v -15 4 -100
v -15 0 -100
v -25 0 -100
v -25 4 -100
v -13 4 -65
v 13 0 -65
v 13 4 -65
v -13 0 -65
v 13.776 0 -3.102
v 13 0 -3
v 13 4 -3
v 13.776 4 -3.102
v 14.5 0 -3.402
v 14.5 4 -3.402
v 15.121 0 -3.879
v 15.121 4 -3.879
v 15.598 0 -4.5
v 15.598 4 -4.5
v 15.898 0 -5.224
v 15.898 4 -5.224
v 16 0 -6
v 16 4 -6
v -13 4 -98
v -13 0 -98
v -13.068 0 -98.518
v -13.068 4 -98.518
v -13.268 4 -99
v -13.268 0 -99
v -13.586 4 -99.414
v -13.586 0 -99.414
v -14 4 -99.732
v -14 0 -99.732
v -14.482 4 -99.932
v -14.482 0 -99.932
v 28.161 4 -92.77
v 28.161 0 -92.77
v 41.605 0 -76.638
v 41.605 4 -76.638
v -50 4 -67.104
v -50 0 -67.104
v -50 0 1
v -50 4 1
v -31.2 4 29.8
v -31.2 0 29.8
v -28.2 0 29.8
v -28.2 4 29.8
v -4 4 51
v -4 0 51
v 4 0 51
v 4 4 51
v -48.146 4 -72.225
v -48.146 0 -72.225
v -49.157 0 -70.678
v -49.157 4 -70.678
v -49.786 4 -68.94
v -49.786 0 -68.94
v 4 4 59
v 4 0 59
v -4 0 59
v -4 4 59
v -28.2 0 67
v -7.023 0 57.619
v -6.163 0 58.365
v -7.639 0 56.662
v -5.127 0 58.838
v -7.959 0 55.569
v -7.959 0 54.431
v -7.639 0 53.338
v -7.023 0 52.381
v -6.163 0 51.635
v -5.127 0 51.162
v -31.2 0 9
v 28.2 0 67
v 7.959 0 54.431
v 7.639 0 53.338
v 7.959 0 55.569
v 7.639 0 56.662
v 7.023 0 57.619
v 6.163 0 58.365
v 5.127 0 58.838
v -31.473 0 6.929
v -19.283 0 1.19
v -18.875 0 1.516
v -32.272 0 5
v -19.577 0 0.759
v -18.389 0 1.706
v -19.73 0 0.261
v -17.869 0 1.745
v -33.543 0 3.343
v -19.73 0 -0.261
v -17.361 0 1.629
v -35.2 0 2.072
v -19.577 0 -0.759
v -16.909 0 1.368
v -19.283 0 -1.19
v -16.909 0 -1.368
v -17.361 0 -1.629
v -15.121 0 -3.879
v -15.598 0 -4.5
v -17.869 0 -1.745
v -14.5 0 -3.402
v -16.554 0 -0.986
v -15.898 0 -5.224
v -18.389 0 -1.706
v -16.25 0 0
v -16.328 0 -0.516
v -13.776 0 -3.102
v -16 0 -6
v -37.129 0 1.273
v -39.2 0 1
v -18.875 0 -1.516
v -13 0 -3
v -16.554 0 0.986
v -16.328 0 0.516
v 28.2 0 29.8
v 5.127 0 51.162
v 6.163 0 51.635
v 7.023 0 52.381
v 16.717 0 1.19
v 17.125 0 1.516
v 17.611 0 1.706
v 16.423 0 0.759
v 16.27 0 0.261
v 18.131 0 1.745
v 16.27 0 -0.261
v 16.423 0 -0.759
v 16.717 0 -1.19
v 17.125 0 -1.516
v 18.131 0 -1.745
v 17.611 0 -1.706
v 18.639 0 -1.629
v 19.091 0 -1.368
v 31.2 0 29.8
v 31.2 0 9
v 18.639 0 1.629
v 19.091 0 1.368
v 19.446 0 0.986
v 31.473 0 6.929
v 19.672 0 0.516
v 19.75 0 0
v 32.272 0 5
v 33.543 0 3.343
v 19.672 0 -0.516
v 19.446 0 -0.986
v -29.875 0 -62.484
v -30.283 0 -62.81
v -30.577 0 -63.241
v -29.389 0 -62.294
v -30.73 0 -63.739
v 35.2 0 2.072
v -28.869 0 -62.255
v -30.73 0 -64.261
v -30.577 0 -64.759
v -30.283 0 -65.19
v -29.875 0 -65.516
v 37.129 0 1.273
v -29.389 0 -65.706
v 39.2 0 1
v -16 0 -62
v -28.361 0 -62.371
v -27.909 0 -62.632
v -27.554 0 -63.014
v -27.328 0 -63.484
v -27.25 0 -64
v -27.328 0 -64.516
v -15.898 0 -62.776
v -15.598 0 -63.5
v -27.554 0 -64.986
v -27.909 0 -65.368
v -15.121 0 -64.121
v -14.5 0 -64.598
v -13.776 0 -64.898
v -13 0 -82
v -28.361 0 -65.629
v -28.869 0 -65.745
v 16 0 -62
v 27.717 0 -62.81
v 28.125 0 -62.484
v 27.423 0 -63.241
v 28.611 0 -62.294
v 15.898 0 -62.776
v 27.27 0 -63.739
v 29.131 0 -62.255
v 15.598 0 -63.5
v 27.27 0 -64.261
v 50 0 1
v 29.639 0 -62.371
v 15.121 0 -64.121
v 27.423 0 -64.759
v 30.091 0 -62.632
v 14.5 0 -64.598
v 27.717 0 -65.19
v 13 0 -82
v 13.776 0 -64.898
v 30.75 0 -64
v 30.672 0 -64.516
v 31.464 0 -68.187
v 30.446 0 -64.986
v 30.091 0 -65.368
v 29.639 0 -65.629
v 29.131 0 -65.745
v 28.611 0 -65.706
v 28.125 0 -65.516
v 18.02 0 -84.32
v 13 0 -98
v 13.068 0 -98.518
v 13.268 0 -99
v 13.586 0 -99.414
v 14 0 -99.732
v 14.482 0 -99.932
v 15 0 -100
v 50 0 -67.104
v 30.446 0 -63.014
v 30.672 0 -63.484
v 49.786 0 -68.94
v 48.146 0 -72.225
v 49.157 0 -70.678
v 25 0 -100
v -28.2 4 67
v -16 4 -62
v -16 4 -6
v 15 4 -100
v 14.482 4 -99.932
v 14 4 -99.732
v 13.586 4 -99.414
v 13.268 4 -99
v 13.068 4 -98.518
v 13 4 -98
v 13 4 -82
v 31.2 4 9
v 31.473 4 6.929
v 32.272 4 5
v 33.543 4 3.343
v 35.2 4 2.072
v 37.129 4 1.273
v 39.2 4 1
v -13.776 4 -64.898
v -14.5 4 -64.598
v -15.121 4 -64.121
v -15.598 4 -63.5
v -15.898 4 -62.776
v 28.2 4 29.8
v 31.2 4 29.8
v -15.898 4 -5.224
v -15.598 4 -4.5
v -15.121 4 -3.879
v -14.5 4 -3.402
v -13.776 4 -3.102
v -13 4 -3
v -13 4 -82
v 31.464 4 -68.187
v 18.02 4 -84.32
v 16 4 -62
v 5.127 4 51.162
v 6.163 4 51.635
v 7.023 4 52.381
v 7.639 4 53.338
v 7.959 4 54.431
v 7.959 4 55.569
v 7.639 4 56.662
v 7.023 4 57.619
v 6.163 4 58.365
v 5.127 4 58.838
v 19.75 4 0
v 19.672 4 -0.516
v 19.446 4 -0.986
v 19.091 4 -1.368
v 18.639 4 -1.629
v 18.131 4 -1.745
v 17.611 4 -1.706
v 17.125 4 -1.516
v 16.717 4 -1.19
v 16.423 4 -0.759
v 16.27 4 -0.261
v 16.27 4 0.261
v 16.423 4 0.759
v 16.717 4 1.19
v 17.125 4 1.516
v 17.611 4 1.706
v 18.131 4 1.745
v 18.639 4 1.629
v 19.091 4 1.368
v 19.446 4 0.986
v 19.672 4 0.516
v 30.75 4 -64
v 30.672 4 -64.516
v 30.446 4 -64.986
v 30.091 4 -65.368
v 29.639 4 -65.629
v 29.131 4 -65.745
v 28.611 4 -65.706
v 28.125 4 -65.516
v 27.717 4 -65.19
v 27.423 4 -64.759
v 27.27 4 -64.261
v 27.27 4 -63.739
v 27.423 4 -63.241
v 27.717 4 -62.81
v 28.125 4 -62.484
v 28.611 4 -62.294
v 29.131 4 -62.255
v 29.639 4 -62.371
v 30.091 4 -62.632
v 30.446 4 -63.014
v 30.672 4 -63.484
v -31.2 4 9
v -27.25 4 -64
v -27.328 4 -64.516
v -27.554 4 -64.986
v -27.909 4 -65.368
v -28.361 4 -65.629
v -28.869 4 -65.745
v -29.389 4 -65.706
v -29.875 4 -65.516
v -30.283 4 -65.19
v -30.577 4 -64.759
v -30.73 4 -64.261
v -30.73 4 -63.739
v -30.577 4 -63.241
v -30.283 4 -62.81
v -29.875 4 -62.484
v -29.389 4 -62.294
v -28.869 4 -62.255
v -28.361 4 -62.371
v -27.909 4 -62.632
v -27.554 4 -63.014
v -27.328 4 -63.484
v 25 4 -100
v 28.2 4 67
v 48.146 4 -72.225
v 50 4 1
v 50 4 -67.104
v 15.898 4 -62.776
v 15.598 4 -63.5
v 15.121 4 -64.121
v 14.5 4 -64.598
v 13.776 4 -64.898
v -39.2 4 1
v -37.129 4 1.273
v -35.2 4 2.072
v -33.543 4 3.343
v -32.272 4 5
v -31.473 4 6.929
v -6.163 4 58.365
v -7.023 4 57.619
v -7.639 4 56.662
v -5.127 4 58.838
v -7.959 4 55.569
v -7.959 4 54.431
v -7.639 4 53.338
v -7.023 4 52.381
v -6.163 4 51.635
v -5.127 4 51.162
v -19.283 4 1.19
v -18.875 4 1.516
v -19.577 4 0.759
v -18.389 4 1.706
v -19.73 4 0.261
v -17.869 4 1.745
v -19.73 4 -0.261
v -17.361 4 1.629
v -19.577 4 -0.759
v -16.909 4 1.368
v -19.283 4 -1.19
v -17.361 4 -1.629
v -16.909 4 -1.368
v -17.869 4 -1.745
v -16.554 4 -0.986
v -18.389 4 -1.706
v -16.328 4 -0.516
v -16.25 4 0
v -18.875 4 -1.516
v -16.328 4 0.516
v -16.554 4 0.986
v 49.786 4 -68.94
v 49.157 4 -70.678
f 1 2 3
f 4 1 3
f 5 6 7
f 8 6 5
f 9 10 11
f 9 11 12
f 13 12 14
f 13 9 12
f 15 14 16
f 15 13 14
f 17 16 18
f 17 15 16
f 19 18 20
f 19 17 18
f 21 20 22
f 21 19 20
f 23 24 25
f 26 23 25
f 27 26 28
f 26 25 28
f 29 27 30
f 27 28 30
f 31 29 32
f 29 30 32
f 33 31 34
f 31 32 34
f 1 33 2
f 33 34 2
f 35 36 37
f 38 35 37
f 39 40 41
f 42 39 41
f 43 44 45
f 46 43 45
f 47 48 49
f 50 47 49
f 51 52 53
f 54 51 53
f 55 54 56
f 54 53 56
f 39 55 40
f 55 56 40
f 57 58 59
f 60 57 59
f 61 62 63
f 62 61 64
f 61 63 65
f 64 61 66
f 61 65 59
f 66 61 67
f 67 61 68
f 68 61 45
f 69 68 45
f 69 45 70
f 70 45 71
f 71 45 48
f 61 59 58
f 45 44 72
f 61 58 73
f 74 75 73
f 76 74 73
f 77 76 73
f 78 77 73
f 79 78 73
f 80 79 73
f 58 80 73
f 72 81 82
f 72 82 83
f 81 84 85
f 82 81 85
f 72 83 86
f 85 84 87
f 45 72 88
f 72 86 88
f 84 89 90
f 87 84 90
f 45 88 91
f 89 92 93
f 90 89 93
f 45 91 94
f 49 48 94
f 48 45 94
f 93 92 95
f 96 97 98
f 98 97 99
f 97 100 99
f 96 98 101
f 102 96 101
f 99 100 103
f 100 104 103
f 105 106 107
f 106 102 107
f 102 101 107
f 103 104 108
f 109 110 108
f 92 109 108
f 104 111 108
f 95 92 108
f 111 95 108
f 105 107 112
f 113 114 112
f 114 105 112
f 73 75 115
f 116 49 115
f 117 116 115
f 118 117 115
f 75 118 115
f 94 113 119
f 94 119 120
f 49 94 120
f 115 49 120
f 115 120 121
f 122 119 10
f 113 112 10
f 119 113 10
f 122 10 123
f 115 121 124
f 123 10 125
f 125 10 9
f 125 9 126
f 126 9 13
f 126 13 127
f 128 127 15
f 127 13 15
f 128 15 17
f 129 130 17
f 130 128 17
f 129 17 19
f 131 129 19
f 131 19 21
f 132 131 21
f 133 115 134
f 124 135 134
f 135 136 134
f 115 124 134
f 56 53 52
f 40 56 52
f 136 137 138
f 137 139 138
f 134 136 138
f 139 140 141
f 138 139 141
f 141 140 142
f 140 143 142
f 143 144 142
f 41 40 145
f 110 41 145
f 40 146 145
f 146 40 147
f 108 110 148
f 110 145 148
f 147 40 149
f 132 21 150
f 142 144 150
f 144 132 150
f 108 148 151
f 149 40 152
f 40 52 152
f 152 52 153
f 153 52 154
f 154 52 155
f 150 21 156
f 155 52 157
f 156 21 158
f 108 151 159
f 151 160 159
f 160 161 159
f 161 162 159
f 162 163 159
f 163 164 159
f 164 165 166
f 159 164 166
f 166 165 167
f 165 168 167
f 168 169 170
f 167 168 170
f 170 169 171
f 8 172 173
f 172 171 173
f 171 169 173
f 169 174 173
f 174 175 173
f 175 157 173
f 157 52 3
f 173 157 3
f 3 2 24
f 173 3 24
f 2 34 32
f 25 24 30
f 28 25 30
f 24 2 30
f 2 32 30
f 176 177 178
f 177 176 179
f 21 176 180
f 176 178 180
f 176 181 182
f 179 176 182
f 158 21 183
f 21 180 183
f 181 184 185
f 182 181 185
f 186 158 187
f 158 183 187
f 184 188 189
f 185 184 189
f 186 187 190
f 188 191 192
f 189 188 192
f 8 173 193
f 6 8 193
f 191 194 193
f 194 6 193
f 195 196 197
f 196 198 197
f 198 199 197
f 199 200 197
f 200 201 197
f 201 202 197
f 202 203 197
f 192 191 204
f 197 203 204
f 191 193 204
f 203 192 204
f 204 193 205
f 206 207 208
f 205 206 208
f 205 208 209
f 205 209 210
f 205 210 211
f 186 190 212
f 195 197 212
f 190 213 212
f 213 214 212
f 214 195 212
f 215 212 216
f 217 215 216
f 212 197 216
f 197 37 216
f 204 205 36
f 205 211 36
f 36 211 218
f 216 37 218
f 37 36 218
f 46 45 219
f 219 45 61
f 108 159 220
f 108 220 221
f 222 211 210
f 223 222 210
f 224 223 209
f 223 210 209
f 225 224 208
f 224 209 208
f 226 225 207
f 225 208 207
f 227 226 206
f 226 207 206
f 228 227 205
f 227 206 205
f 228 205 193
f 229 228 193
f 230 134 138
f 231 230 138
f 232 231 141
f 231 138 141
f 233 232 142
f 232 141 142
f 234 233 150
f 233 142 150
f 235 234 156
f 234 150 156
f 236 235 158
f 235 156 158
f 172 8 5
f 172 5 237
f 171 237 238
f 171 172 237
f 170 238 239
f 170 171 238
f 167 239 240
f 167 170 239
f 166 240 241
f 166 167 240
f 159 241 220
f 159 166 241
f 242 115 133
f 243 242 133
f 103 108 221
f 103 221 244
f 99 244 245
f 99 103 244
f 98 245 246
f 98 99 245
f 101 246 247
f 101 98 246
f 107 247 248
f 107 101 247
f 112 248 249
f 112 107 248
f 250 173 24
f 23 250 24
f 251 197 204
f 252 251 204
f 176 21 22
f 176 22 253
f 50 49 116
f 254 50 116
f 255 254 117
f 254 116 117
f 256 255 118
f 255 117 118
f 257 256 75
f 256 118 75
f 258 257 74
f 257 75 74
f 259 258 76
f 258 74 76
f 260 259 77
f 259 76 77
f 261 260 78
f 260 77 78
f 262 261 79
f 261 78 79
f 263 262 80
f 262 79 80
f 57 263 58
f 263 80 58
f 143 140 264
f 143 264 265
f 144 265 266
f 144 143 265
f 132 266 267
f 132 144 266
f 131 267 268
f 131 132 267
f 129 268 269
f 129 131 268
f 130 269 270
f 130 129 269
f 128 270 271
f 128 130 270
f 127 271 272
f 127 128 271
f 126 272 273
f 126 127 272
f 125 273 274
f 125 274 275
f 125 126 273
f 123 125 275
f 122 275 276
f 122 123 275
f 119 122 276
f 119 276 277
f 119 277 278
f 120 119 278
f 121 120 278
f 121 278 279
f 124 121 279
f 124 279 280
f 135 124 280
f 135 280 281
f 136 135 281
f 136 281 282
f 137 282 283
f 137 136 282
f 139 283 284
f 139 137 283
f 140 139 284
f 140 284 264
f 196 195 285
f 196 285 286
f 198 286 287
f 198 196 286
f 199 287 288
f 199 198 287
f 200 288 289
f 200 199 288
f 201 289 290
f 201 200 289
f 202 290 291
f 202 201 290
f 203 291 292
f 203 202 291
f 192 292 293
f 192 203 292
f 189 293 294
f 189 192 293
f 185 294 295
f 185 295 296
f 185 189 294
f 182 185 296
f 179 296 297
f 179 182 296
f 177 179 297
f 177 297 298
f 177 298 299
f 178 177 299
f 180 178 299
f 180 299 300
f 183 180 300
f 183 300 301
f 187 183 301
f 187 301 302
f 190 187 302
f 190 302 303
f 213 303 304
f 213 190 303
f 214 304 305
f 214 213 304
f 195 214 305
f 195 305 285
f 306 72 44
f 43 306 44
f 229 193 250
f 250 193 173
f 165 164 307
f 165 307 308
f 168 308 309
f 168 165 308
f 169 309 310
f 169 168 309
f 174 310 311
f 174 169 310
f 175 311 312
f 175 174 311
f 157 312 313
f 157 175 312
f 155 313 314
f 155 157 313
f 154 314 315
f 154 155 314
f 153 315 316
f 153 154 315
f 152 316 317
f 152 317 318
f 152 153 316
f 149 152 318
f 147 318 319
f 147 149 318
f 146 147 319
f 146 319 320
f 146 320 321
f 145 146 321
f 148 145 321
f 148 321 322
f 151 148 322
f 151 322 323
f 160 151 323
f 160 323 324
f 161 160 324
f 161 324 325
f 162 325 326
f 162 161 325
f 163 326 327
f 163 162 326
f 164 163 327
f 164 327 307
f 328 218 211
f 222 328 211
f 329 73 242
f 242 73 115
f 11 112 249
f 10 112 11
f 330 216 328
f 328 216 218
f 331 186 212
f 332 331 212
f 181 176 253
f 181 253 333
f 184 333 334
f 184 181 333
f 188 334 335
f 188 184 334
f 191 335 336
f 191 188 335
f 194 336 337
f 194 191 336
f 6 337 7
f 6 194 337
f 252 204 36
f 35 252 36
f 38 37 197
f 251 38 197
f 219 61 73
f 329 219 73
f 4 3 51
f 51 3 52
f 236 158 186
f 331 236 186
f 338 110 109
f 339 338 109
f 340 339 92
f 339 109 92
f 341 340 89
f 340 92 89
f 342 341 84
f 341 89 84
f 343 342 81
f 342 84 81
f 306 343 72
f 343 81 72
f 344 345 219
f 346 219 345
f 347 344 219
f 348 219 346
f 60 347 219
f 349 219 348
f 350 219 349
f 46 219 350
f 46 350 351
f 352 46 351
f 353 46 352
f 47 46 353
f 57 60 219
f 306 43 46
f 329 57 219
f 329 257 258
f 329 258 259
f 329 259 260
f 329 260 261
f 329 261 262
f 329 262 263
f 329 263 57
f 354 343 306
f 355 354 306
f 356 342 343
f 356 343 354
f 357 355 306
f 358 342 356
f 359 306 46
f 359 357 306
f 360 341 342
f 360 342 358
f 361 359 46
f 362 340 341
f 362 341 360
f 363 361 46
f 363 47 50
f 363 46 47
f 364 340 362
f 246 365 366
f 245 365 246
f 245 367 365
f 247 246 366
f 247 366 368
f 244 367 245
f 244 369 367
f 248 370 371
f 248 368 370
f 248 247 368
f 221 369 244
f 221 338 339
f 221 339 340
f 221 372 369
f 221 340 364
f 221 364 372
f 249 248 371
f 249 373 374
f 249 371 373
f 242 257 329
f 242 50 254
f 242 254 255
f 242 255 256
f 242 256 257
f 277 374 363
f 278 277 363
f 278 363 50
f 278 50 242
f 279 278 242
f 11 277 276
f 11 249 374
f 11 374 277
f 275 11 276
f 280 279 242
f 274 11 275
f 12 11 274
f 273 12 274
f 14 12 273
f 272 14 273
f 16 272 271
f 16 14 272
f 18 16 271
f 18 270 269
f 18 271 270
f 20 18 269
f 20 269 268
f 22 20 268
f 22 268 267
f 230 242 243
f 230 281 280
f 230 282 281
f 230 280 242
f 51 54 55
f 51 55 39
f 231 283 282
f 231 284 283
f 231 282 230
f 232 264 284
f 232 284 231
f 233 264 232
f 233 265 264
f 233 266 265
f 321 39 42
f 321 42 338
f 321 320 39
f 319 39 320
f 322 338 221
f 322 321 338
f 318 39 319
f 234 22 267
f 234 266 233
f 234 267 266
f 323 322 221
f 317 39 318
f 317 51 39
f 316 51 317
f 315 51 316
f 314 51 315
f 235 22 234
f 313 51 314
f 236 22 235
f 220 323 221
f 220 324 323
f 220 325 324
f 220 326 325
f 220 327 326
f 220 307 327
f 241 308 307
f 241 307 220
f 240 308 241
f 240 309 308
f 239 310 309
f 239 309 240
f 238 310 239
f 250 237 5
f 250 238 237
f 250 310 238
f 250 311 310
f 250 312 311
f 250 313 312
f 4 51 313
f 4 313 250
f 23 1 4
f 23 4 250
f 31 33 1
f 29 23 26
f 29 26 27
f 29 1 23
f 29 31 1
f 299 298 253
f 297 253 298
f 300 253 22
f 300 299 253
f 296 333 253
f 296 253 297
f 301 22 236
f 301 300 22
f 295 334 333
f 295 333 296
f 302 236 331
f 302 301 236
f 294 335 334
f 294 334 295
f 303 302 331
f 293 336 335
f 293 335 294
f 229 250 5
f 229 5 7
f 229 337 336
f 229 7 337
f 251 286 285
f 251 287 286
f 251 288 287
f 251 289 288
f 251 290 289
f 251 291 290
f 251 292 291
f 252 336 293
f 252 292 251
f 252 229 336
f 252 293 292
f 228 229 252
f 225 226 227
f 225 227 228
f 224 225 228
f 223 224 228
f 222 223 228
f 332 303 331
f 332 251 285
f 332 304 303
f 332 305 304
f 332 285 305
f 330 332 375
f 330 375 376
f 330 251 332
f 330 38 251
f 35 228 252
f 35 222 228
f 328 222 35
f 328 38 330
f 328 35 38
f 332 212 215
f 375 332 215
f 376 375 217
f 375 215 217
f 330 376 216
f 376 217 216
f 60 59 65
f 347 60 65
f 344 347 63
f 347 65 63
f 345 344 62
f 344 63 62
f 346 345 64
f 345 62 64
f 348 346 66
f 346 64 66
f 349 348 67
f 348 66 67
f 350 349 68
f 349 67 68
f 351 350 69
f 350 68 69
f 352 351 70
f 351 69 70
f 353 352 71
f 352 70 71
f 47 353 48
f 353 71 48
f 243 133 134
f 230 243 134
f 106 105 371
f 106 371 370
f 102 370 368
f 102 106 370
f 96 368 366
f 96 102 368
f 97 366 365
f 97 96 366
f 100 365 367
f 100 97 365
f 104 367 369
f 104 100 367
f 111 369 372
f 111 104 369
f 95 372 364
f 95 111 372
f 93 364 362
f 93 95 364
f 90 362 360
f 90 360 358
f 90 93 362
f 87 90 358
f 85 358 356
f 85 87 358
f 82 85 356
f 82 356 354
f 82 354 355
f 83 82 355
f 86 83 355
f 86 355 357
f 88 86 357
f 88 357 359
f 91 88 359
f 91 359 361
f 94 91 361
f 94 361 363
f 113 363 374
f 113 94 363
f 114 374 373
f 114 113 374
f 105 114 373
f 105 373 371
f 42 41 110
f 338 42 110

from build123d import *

# Parameters (mm, degrees)
SKETCH1_R           = 1.75
BOSS_EXTRUDE1_DEPTH = 4


with BuildPart() as part:
    # Sketch1 → Boss-Extrude1 (new body)
    with BuildSketch(Plane(origin=(0, 0, 0), x_dir=(1, 0, 0), z_dir=(0, 1, 0))):
        with BuildLine():
            Line((-28.2, -67), (28.2, -67))
            Line((28.2, -67), (28.2, -29.8))
            Line((28.2, -29.8), (31.2, -29.8))
            Line((31.2, -29.8), (31.2, -9))
            ThreePointArc((31.2, -9), (33.543145751, -3.343145751), (39.2, -1))
            Line((39.2, -1), (50, -1))
            Line((50, -1), (50, 67.103600519))
            ThreePointArc((50, 67.103600519), (49.522172621, 69.827002629), (48.145770237, 72.225075716))
            Line((48.145770237, 72.225075716), (25, 100))
            Line((25, 100), (15, 100))
            ThreePointArc((15, 100), (13.585786438, 99.414213562), (13, 98))
            Line((13, 98), (13, 82))
            Line((13, 82), (-13, 82))
            Line((-13, 82), (-13, 98))
            ThreePointArc((-13, 98), (-13.585786438, 99.414213562), (-15, 100))
            Line((-15, 100), (-25, 100))
            Line((-25, 100), (-48.145770237, 72.225075716))
            ThreePointArc((-48.145770237, 72.225075716), (-49.522172621, 69.827002629), (-50, 67.103600519))
            Line((-50, 67.103600519), (-50, -1))
            Line((-50, -1), (-39.2, -1))
            ThreePointArc((-39.2, -1), (-33.543145751, -3.343145751), (-31.2, -9))
            Line((-31.2, -9), (-31.2, -29.8))
            Line((-31.2, -29.8), (-28.2, -29.8))
            Line((-28.2, -29.8), (-28.2, -67))
        make_face()
        with Locations((18, 0)):
            Circle(SKETCH1_R, mode=Mode.SUBTRACT)
        with Locations((-18, 0)):
            Circle(SKETCH1_R, mode=Mode.SUBTRACT)
        with Locations((29, 64)):
            Circle(SKETCH1_R, mode=Mode.SUBTRACT)
        with Locations((-29, 64)):
            Circle(SKETCH1_R, mode=Mode.SUBTRACT)
        with BuildLine():
            Line((-13, 3), (13, 3))
            ThreePointArc((13, 3), (15.121320344, 3.878679656), (16, 6))
            Line((16, 6), (16, 62))
            ThreePointArc((16, 62), (15.121320344, 64.121320344), (13, 65))
            Line((13, 65), (-13, 65))
            ThreePointArc((-13, 65), (-15.121320344, 64.121320344), (-16, 62))
            Line((-16, 62), (-16, 6))
            ThreePointArc((-16, 6), (-15.121320344, 3.878679656), (-13, 3))
        make_face(mode=Mode.SUBTRACT)
        with BuildLine():
            Line((-4, -51), (4, -51))
            ThreePointArc((4, -51), (8, -55), (4, -59))
            Line((4, -59), (-4, -59))
            ThreePointArc((-4, -59), (-8, -55), (-4, -51))
        make_face(mode=Mode.SUBTRACT)
        Polygon((28.160862107, 92.770455614), (41.6047345, 76.637808743), (31.464213609, 68.187374667), (18.020341216, 84.320021539), align=None, mode=Mode.SUBTRACT)
    extrude(amount=BOSS_EXTRUDE1_DEPTH)


solid = part.part
